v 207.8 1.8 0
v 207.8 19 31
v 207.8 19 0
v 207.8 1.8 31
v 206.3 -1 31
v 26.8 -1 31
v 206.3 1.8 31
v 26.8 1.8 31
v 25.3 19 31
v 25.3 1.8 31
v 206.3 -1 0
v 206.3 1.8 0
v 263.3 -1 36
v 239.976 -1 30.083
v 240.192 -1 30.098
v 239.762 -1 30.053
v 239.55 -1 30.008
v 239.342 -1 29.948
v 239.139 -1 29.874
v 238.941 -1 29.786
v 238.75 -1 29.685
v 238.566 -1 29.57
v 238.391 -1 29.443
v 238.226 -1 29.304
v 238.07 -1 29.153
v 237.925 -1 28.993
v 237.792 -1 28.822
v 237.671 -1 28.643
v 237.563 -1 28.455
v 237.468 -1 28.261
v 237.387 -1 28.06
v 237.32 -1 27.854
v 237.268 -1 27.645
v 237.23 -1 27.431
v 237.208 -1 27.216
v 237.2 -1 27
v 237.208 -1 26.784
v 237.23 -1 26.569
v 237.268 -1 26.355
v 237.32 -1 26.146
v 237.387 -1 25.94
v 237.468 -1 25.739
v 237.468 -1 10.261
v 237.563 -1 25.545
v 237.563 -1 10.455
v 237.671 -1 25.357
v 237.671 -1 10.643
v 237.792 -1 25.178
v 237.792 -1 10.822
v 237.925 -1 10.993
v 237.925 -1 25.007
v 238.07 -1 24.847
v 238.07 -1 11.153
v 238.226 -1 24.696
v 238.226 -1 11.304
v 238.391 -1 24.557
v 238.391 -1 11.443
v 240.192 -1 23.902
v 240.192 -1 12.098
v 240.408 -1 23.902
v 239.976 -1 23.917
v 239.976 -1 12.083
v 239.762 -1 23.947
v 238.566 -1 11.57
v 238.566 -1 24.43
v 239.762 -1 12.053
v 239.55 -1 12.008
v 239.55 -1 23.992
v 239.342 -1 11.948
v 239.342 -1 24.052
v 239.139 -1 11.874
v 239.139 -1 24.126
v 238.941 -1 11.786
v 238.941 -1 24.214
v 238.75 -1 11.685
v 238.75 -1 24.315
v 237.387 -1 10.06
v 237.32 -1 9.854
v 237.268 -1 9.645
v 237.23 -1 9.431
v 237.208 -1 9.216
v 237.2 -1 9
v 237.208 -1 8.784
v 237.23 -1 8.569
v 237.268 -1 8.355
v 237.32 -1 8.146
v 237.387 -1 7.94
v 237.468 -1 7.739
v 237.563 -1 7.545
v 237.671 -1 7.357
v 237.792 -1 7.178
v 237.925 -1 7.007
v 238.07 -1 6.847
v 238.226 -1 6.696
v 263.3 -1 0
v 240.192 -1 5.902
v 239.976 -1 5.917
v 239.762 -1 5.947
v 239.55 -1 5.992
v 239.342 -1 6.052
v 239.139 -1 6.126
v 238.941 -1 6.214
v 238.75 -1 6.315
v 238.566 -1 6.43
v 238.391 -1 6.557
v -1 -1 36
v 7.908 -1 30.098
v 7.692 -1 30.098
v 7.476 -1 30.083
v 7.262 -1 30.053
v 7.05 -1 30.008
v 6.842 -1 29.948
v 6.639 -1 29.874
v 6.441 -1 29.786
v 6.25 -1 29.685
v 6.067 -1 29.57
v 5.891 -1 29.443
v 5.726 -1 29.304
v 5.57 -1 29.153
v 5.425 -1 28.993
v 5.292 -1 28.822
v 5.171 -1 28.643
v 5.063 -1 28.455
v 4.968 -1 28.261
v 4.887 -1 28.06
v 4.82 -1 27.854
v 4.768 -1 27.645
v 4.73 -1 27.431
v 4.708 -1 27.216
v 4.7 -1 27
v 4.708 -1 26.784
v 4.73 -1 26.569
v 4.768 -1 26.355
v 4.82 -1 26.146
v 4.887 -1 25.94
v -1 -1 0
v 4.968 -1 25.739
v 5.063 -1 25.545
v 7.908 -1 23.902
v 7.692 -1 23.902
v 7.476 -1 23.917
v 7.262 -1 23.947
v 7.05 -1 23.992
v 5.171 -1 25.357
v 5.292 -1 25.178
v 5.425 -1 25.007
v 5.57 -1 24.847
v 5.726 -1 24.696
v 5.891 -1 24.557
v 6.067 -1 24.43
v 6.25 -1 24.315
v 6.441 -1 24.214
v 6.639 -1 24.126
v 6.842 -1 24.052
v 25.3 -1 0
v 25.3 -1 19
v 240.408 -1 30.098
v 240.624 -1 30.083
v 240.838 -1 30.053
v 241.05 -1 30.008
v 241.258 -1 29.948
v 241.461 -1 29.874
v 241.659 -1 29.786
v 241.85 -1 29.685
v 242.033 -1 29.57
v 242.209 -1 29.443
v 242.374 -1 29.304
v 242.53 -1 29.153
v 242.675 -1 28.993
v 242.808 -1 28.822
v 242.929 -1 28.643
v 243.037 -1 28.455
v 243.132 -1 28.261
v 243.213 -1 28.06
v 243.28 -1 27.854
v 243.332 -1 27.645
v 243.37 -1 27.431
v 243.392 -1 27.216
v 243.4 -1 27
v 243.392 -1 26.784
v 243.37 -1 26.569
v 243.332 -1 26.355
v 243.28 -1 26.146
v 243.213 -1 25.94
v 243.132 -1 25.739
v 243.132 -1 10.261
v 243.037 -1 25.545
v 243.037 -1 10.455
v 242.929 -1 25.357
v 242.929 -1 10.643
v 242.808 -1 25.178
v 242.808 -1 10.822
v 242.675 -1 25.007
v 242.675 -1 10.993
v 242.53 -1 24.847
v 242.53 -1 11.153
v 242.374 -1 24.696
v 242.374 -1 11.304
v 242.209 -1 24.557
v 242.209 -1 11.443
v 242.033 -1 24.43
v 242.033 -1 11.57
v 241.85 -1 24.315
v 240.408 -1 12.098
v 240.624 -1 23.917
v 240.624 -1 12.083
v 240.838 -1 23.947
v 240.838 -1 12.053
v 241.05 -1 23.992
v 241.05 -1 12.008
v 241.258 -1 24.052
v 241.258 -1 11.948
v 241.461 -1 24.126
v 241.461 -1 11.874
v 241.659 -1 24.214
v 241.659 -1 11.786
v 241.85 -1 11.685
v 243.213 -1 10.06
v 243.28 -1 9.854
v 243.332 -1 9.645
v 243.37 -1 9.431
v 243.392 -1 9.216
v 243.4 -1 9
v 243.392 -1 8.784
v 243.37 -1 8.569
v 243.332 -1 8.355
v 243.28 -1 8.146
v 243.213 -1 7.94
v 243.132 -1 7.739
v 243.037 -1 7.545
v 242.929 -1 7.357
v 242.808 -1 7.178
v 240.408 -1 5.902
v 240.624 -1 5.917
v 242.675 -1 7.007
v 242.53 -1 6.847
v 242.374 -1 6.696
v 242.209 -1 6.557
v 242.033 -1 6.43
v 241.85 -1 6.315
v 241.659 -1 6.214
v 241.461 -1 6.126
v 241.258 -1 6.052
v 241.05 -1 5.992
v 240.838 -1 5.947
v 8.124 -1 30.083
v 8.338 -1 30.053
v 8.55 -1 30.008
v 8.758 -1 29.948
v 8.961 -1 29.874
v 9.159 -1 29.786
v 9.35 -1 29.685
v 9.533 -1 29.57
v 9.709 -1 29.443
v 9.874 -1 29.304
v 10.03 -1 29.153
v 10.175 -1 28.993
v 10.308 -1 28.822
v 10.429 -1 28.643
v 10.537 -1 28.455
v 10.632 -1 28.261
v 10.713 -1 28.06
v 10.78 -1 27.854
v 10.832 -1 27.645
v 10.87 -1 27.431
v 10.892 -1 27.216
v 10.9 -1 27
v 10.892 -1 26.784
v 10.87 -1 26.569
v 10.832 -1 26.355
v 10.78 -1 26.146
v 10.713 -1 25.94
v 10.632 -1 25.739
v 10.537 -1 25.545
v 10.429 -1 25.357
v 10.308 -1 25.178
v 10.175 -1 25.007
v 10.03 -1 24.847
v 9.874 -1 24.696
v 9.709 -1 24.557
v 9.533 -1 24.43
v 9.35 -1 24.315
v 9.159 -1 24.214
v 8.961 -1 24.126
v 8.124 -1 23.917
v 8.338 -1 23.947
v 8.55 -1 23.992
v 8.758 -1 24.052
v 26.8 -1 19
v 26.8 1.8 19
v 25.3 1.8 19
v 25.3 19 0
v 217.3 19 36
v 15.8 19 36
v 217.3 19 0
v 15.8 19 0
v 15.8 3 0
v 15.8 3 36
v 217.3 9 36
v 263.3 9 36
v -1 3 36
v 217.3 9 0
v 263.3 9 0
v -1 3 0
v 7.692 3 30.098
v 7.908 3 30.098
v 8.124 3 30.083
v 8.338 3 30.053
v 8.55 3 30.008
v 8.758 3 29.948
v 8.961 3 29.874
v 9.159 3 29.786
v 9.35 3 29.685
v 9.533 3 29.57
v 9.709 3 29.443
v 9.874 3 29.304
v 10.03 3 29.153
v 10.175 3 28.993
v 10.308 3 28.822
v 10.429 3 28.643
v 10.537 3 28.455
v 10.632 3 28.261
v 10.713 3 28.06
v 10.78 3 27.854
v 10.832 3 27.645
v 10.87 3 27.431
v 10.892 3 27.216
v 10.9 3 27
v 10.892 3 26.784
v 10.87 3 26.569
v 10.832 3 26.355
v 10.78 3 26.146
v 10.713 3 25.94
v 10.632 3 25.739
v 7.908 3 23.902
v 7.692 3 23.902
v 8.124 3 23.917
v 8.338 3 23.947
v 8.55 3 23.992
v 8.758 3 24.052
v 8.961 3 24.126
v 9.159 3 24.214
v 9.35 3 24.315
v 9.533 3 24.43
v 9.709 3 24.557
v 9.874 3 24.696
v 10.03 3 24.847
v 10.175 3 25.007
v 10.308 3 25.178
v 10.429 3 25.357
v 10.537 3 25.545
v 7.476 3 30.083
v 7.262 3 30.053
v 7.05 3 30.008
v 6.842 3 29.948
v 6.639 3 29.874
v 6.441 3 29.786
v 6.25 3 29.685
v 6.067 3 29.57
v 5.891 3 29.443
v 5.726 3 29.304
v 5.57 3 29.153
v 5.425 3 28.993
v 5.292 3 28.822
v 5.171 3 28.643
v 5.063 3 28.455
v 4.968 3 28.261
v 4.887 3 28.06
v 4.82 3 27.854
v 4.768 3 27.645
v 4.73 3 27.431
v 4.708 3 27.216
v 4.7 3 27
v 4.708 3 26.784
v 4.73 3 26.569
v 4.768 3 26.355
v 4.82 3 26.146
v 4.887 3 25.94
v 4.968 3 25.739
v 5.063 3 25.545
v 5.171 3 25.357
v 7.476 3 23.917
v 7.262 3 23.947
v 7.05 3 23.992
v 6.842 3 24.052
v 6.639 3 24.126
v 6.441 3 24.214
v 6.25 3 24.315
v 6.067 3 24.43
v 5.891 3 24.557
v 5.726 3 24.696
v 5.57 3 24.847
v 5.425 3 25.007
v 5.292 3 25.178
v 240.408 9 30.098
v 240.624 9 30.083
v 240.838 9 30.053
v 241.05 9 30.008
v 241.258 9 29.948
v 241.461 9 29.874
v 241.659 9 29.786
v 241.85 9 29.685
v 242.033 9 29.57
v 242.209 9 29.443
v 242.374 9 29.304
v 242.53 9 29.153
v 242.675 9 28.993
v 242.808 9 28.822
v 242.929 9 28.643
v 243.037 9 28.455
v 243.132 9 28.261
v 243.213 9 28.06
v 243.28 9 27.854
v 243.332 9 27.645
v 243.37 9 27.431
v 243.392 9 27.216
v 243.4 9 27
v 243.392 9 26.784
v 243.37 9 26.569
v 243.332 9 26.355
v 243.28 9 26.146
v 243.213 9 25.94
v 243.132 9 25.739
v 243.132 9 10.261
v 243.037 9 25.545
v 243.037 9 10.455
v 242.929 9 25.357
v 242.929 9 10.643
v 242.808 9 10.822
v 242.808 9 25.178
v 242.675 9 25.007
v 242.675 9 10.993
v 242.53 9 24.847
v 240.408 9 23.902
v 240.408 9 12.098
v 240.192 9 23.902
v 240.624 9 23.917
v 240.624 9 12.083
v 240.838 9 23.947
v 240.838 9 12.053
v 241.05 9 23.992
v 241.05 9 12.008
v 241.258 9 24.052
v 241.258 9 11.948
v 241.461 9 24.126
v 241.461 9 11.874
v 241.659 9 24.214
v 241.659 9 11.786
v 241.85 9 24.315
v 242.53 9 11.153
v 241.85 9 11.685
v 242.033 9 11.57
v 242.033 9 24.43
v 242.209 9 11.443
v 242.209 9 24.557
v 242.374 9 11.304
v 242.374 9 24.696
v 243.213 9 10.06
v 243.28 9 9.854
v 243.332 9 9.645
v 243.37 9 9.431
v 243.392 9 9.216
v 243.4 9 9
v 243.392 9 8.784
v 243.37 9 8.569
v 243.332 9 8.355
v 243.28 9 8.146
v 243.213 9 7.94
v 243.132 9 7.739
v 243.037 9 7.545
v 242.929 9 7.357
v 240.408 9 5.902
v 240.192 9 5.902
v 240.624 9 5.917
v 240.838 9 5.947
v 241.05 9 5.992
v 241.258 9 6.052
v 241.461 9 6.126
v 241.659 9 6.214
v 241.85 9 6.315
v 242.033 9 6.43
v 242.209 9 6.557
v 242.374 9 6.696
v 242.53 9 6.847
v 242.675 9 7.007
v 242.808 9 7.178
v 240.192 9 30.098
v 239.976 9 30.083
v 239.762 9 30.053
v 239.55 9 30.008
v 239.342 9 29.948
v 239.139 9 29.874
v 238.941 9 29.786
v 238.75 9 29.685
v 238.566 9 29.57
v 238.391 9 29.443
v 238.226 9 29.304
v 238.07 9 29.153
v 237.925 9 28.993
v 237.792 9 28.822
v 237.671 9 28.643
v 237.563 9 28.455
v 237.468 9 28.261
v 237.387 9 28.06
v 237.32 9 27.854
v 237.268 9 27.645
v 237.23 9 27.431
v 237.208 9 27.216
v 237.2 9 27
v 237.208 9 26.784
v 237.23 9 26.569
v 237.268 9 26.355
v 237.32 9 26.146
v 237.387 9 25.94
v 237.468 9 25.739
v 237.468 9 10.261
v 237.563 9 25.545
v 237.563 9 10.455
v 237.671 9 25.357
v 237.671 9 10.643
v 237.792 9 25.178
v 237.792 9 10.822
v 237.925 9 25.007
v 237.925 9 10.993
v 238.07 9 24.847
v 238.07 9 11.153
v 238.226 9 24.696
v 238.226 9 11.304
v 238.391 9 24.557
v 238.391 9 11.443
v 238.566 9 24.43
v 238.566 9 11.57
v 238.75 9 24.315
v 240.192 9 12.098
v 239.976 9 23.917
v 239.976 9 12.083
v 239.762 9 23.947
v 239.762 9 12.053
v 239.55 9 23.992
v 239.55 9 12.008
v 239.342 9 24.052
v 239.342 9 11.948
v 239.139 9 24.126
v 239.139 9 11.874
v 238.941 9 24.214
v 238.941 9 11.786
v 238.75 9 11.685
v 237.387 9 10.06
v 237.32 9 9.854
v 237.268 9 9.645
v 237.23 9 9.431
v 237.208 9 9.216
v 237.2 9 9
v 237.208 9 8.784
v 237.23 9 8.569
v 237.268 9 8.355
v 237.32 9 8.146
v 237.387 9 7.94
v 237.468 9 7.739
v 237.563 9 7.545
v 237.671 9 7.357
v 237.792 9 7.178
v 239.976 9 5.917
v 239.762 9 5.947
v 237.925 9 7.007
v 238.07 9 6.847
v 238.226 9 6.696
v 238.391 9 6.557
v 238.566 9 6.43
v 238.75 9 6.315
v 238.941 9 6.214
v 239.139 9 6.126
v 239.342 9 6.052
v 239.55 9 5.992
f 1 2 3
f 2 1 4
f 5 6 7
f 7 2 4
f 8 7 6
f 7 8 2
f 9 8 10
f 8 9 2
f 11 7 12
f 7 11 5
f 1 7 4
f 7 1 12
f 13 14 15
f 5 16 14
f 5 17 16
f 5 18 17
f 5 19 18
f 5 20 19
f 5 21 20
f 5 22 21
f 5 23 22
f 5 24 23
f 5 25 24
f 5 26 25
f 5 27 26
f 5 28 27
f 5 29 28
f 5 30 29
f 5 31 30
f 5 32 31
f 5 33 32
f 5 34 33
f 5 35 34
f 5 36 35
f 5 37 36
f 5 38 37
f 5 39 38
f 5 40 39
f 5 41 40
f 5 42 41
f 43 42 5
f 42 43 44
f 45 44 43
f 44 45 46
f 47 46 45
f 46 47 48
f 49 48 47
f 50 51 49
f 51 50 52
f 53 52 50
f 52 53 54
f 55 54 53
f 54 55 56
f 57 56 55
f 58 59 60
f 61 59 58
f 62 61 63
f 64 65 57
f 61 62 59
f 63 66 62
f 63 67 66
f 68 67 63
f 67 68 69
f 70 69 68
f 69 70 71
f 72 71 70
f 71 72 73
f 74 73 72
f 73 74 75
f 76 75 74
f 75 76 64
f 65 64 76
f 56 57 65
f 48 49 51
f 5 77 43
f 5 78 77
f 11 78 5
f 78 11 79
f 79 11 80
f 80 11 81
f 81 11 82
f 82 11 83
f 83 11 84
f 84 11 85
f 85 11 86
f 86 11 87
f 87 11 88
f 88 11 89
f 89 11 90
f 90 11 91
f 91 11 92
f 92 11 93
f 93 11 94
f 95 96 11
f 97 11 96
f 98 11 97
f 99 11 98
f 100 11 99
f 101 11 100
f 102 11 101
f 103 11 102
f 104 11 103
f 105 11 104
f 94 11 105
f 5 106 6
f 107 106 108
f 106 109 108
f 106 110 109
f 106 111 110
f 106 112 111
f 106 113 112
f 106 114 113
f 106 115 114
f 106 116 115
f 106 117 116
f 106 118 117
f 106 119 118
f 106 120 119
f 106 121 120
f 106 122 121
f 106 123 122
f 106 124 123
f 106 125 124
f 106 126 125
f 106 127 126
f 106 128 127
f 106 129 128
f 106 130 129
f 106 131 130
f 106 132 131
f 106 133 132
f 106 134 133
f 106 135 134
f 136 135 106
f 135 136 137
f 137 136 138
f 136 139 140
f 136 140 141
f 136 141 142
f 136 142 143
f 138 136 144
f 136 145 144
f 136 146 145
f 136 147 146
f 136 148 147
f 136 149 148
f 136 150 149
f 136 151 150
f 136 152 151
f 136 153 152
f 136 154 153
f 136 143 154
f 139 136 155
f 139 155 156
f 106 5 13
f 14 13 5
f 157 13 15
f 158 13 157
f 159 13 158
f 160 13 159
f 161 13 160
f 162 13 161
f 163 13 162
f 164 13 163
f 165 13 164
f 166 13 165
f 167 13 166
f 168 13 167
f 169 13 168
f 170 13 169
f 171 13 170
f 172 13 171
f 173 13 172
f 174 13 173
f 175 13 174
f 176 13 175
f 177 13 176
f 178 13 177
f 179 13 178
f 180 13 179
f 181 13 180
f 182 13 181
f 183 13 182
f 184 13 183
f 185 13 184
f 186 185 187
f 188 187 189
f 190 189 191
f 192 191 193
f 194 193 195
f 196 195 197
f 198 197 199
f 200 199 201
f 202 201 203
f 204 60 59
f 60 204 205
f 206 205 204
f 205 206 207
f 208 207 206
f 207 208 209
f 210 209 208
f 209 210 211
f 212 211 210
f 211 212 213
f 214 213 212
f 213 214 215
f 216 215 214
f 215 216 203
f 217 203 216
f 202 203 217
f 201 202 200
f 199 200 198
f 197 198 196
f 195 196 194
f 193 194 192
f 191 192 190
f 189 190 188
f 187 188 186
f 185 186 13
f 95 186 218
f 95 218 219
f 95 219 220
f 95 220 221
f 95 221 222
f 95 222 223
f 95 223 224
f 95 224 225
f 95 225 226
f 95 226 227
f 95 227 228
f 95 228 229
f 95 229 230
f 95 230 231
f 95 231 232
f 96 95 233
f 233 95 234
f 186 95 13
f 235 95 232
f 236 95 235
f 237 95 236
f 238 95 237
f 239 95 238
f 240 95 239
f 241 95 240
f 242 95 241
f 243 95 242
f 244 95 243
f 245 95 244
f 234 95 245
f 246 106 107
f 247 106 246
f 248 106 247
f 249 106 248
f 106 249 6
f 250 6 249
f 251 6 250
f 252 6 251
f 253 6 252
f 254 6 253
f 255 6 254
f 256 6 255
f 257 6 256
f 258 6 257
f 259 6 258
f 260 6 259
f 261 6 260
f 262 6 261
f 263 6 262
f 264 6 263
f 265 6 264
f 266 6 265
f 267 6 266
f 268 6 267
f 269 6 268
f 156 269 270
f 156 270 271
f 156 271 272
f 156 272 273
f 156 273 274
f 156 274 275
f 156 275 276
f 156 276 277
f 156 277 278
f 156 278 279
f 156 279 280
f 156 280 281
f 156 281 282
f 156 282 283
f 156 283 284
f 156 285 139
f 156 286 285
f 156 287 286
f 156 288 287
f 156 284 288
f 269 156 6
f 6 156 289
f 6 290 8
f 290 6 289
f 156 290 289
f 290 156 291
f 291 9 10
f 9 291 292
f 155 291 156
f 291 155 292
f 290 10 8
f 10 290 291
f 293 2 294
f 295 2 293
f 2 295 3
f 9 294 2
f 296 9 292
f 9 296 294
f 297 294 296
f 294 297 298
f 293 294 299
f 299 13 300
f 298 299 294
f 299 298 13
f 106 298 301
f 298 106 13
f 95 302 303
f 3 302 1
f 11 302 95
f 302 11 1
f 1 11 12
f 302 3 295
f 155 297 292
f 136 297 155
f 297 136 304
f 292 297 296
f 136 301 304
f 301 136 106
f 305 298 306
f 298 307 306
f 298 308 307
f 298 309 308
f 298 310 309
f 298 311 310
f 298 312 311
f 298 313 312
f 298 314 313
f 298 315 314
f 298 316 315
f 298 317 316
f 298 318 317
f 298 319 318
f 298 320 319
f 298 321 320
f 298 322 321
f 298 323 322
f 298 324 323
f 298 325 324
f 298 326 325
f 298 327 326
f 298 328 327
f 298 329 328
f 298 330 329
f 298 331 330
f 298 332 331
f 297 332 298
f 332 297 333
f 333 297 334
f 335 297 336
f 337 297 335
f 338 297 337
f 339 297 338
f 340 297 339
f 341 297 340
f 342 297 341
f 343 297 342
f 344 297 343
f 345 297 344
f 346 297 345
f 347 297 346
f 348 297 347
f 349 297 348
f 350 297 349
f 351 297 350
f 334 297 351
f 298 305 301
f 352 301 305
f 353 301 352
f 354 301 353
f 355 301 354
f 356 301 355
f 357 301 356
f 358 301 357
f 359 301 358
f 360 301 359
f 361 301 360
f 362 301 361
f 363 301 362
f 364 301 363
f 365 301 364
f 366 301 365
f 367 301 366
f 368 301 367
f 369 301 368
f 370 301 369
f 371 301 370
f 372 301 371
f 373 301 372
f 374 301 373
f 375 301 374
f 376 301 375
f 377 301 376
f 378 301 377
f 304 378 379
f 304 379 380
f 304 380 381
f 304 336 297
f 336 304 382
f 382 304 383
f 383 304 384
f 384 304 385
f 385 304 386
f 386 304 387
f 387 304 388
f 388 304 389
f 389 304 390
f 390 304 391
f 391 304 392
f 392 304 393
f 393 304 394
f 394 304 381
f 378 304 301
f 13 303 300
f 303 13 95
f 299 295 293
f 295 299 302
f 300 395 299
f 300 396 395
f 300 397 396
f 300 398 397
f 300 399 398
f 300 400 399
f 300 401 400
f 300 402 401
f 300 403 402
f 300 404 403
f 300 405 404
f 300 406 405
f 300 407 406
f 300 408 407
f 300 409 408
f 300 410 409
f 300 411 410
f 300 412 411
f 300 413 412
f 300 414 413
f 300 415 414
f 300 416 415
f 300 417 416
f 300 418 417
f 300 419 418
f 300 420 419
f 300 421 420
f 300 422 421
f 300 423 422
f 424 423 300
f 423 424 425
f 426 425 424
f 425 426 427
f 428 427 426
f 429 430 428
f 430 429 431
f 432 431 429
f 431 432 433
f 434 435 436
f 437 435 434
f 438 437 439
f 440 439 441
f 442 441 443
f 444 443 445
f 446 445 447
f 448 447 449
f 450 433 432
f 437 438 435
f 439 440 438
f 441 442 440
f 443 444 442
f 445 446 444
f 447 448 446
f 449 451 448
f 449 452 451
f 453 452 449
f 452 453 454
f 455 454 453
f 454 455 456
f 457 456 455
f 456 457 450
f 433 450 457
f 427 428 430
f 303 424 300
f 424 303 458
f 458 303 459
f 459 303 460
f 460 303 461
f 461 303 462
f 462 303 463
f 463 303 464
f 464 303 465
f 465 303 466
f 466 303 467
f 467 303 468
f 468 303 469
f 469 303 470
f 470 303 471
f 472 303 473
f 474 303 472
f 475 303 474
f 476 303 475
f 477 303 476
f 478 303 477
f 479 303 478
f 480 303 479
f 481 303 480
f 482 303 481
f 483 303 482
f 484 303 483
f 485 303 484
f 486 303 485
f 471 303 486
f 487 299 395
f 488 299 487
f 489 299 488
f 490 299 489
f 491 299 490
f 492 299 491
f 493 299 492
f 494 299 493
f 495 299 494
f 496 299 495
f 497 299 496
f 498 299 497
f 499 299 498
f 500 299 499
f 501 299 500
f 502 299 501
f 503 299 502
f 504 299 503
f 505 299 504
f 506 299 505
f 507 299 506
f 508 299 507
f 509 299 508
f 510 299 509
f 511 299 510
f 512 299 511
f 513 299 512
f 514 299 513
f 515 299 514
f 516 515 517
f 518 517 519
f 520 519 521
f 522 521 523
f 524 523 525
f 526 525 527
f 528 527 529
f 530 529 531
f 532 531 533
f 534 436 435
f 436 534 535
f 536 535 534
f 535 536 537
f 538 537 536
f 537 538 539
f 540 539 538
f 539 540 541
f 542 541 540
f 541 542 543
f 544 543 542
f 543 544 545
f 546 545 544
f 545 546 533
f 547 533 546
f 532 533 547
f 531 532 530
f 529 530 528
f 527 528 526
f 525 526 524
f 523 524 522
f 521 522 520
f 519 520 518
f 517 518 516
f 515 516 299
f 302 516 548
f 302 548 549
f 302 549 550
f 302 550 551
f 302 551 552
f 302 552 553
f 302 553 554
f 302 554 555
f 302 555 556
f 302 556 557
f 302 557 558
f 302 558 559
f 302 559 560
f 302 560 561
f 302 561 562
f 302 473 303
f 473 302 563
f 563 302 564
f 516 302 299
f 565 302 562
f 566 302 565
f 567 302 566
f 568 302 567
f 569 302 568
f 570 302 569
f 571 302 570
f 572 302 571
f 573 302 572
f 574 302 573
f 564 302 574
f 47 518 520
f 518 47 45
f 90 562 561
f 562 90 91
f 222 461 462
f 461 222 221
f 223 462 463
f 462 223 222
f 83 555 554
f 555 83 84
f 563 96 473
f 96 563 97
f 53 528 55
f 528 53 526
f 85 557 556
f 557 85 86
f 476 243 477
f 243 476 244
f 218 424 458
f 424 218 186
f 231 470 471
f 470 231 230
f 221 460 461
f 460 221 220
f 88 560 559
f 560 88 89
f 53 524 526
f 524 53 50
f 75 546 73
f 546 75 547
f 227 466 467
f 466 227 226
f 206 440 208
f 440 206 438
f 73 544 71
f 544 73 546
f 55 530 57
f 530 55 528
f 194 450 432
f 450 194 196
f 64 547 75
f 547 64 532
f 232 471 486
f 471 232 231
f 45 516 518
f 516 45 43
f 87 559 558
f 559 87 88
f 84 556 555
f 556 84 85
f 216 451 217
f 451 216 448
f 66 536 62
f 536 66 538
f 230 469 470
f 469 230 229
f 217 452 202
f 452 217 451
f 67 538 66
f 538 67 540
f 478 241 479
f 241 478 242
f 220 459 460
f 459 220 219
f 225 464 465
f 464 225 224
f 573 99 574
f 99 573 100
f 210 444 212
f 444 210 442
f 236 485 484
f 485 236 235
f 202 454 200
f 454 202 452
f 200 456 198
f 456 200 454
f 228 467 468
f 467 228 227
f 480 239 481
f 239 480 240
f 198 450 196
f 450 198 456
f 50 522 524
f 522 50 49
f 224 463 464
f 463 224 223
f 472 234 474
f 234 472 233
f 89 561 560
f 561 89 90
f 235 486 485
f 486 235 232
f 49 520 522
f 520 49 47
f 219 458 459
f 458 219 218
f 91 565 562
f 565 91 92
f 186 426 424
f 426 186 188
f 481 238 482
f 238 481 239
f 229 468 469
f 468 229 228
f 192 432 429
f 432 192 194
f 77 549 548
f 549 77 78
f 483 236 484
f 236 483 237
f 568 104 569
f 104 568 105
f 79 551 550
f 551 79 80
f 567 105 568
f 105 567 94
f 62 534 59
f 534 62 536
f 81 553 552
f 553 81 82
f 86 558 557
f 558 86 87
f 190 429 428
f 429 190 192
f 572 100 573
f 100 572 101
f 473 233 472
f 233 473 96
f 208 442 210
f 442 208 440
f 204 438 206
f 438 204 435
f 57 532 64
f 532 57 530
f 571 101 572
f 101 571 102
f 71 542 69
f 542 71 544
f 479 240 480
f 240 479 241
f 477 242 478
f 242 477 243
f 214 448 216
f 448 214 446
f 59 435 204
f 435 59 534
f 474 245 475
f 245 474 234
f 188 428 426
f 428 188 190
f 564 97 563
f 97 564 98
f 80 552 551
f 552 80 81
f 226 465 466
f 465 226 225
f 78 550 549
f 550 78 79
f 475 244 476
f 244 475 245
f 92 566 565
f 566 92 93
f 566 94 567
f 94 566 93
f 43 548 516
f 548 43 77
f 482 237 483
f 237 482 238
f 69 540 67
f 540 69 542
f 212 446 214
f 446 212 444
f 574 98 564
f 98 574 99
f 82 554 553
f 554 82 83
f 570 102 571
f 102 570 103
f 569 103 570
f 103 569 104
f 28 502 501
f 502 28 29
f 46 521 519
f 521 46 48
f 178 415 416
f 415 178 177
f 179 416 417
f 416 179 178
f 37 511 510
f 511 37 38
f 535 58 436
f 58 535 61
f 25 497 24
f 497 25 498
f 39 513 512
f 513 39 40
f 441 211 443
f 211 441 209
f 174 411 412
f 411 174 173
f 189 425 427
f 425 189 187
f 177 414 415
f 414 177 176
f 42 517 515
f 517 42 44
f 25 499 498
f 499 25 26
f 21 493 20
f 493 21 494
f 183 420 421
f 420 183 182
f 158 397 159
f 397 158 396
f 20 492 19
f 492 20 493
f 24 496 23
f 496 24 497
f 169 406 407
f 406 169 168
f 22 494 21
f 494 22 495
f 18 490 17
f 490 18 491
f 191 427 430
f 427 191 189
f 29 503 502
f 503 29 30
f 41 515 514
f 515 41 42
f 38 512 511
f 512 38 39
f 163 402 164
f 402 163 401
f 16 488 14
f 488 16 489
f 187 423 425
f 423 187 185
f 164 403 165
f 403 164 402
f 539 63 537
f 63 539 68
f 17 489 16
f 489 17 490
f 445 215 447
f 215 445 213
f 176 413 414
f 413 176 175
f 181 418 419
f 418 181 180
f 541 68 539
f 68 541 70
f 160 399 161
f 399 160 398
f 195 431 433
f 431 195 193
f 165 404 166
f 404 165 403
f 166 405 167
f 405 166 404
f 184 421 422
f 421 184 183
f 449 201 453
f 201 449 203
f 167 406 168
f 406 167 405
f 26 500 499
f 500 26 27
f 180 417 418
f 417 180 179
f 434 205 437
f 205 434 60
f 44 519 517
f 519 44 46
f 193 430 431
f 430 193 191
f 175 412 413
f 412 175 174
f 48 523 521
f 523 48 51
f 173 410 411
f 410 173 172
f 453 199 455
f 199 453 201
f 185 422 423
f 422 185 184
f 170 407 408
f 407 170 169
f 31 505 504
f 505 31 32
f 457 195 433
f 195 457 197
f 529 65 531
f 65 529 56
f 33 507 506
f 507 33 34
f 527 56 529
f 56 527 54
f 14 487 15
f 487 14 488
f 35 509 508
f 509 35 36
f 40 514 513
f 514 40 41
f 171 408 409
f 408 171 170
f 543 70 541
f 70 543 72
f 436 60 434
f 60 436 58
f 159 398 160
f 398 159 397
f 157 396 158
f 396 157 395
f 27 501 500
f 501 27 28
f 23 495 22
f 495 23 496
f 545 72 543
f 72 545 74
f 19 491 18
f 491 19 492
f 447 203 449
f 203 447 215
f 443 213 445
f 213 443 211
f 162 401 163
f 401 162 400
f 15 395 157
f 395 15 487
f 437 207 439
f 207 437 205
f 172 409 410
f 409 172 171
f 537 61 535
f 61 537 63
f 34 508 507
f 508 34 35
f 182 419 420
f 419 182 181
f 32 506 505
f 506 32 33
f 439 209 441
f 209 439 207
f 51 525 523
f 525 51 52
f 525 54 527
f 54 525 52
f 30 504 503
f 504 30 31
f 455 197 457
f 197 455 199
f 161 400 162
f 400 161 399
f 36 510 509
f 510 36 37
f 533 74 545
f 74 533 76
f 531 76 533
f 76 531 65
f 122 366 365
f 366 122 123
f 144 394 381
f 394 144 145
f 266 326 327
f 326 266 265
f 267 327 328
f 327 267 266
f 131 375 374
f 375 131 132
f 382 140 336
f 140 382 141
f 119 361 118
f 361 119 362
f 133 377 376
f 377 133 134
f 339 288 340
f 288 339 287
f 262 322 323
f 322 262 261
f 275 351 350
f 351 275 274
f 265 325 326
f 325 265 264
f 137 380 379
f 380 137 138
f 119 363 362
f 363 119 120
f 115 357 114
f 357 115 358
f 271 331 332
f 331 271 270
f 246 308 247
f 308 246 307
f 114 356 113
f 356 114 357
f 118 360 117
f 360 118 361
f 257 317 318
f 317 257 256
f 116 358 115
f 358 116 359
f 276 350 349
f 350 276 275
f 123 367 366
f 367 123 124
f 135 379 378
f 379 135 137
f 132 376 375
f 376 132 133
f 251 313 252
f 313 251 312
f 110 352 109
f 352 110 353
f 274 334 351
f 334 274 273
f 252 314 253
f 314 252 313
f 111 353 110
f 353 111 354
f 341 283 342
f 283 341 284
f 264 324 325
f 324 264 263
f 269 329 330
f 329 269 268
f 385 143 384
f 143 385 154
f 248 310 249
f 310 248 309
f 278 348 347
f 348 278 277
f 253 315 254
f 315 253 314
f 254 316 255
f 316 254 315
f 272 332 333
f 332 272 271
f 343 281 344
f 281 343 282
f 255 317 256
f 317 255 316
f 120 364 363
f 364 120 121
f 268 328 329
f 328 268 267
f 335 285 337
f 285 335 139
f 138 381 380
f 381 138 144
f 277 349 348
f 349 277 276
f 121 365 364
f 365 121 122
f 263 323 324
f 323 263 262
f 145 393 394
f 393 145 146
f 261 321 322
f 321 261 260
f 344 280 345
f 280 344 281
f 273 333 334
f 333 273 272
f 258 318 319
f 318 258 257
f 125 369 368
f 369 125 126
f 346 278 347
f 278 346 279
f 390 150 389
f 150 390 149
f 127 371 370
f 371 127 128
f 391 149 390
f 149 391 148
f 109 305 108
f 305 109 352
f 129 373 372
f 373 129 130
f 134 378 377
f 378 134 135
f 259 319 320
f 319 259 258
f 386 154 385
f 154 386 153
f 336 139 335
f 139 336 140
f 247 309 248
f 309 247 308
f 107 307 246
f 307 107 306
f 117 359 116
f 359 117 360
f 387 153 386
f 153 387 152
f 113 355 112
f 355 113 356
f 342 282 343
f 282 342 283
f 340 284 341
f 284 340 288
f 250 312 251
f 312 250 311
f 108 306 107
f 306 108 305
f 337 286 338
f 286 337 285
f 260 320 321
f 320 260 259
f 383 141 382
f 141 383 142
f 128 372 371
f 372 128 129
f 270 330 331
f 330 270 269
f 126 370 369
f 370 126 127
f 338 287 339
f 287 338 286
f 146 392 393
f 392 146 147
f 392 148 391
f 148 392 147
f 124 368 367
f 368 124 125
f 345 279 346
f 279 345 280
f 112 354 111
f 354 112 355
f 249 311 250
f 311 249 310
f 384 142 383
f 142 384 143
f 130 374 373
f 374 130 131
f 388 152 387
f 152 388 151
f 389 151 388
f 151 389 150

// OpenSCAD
// file: ../../utils/constants.scad
$fn=90;  // accuracy

/* Server dimentions */

// one server unit
c_u1 = 44.45;  

// two server unit
c_u2 = c_u1*2;   

// total width
// The total with of the a server rack (19")
// this includes the mounting holes
c_tw  = 482.6; 

// Total inner width
// The distance between the mounting holes in the server rack
c_tiw = 450; // TODO: 432?  


/* Rack hole dimentions */

// width distance rack holes
c_wdrh = 465;

// height distance rack holes
c_hdrh = 33;


/* dell optiplex 7040 micro usff dimentions */

// dell optiplex 7040 height
c_do7040h = 36;

// dell optiplex 7040 width
c_do7040w = 182;

// dell optiplex 7040 depth
c_do7040d = 179;

// dell optiplex 7040 rubber feet width distance
c_do7040rfwd = 14.9;

// dell optiplex 7040 rubber feet back depth distance
c_do7040rfbdd = 9.9;


/* Case dimentions */

// case height outer 
// A small margin is included to so that the case does not 
// exide two server units
c_cho = c_u2-0.2; 

// case height inner
// The thickness of the walls can then be calculated as (cho-chi)/2
c_chi = c_cho-7*2;

// case width outer
// as there are three parts of the rack server case we just devide
// the total inner width with three 
c_cwo = c_tiw/3;

// case width inner
// 132 was calculated by defining by the desired with between each node, 
// i.e., 22. The first and last hole is 22/2 mm away from the side of the case.
// This gives us 22*5+(22/2)*2 = 22*6 = 132
c_cwi = 132;

// case depth thickness
// How thick the case should be. It should not be that important.
// Just know that it is enough for a screw to thread in the case 
c_cdt = 14;

// case inner side thickness
// The middle and the side case over lap so that a screw can be entered
// between the two cases. The cist is defined as the thickness of the part
// that does not overlap between the midle and side case.
c_cist = 3.5;

// nodes per case
c_npc = 6;
// main file
include <../../utils/constants.scad>;

module usff7040(a_depth, a_isLeft) {
  m = 0.5; // margin
  bottomMargin = 4;

  sideMountHoleDiameter = 6.2; 
  sideMountWidth = (c_tw - c_tiw)/2;
  sideMountThickness = 4;
  sideThickness = 10;

  topHoleToFloor = 35;//-4;
  topHoleToBottom = topHoleToFloor-bottomMargin;
  topThickness = 5;
  topHoleToTop = topThickness+4;

  sideAttachersWidth = 2.8;
  sideAttachersThickness = 1.5;
  sideAttachersLeftHeight = 12;


  intersectionWidth = c_tiw-(c_do7040w*2+sideThickness*4);
  intersectionHoleDiameter = 6.2;

  height = topHoleToBottom+topThickness; //c_hdrh+topToMountHole;
  width = c_do7040w+sideThickness*2+intersectionWidth+sideMountWidth;


  difference() {
    cube([width, a_depth, height]);

    union() {
      if (a_isLeft) {
        translate([0,sideMountThickness,0])
        cube([sideMountWidth+m, a_depth, height]);

        translate([sideMountWidth+sideThickness,0,-topThickness])
        difference() {
          cube([c_do7040w+m, a_depth, c_do7040h]);

          union() {
            translate([c_do7040w+m-sideAttachersThickness,0,0])
            #cube([sideAttachersThickness, sideAttachersWidth, c_do7040h]);

            translate([0,0,c_do7040h-sideAttachersLeftHeight])
            #cube([sideAttachersThickness, sideAttachersWidth, sideAttachersLeftHeight]);
          }
        }
      }
      else {
        translate([0,-sideMountThickness,0])
        cube([sideMountWidth+m, a_depth, height]);

        translate([sideMountWidth+sideThickness,0,-topThickness])
        difference() {
          cube([c_do7040w+m, a_depth, c_do7040h]);

          union() {
            translate([0,a_depth-sideAttachersWidth,0])
            #cube([sideAttachersThickness, sideAttachersWidth, c_do7040h]);

            translate([c_do7040w+m-sideAttachersThickness,a_depth-sideAttachersWidth,c_do7040h-sideAttachersLeftHeight])
            cube([sideAttachersThickness, sideAttachersWidth, sideAttachersLeftHeight]);
          }
        }
      }

      translate([width-intersectionWidth,a_depth/2,0])
      #cube([intersectionWidth, a_depth, height]);

      translate([width-intersectionWidth/2, a_depth, height/4])
      rotate([90,0,0])
      #cylinder(d=intersectionHoleDiameter, h=a_depth);

      translate([width-intersectionWidth/2, a_depth, height*3/4])
      rotate([90,0,0])
      #cylinder(d=intersectionHoleDiameter, h=a_depth);

      translate([(c_tw-c_wdrh)/2,a_depth,height-topHoleToTop])
      rotate([90,0,0])
      #cylinder(d=sideMountHoleDiameter, h=a_depth);
    }
  }
}

translate([-1,-1,0])
usff7040(20,true);

//translate([c_tw,20,0])
//rotate([180,180,0])
//usff7040(20,false);
